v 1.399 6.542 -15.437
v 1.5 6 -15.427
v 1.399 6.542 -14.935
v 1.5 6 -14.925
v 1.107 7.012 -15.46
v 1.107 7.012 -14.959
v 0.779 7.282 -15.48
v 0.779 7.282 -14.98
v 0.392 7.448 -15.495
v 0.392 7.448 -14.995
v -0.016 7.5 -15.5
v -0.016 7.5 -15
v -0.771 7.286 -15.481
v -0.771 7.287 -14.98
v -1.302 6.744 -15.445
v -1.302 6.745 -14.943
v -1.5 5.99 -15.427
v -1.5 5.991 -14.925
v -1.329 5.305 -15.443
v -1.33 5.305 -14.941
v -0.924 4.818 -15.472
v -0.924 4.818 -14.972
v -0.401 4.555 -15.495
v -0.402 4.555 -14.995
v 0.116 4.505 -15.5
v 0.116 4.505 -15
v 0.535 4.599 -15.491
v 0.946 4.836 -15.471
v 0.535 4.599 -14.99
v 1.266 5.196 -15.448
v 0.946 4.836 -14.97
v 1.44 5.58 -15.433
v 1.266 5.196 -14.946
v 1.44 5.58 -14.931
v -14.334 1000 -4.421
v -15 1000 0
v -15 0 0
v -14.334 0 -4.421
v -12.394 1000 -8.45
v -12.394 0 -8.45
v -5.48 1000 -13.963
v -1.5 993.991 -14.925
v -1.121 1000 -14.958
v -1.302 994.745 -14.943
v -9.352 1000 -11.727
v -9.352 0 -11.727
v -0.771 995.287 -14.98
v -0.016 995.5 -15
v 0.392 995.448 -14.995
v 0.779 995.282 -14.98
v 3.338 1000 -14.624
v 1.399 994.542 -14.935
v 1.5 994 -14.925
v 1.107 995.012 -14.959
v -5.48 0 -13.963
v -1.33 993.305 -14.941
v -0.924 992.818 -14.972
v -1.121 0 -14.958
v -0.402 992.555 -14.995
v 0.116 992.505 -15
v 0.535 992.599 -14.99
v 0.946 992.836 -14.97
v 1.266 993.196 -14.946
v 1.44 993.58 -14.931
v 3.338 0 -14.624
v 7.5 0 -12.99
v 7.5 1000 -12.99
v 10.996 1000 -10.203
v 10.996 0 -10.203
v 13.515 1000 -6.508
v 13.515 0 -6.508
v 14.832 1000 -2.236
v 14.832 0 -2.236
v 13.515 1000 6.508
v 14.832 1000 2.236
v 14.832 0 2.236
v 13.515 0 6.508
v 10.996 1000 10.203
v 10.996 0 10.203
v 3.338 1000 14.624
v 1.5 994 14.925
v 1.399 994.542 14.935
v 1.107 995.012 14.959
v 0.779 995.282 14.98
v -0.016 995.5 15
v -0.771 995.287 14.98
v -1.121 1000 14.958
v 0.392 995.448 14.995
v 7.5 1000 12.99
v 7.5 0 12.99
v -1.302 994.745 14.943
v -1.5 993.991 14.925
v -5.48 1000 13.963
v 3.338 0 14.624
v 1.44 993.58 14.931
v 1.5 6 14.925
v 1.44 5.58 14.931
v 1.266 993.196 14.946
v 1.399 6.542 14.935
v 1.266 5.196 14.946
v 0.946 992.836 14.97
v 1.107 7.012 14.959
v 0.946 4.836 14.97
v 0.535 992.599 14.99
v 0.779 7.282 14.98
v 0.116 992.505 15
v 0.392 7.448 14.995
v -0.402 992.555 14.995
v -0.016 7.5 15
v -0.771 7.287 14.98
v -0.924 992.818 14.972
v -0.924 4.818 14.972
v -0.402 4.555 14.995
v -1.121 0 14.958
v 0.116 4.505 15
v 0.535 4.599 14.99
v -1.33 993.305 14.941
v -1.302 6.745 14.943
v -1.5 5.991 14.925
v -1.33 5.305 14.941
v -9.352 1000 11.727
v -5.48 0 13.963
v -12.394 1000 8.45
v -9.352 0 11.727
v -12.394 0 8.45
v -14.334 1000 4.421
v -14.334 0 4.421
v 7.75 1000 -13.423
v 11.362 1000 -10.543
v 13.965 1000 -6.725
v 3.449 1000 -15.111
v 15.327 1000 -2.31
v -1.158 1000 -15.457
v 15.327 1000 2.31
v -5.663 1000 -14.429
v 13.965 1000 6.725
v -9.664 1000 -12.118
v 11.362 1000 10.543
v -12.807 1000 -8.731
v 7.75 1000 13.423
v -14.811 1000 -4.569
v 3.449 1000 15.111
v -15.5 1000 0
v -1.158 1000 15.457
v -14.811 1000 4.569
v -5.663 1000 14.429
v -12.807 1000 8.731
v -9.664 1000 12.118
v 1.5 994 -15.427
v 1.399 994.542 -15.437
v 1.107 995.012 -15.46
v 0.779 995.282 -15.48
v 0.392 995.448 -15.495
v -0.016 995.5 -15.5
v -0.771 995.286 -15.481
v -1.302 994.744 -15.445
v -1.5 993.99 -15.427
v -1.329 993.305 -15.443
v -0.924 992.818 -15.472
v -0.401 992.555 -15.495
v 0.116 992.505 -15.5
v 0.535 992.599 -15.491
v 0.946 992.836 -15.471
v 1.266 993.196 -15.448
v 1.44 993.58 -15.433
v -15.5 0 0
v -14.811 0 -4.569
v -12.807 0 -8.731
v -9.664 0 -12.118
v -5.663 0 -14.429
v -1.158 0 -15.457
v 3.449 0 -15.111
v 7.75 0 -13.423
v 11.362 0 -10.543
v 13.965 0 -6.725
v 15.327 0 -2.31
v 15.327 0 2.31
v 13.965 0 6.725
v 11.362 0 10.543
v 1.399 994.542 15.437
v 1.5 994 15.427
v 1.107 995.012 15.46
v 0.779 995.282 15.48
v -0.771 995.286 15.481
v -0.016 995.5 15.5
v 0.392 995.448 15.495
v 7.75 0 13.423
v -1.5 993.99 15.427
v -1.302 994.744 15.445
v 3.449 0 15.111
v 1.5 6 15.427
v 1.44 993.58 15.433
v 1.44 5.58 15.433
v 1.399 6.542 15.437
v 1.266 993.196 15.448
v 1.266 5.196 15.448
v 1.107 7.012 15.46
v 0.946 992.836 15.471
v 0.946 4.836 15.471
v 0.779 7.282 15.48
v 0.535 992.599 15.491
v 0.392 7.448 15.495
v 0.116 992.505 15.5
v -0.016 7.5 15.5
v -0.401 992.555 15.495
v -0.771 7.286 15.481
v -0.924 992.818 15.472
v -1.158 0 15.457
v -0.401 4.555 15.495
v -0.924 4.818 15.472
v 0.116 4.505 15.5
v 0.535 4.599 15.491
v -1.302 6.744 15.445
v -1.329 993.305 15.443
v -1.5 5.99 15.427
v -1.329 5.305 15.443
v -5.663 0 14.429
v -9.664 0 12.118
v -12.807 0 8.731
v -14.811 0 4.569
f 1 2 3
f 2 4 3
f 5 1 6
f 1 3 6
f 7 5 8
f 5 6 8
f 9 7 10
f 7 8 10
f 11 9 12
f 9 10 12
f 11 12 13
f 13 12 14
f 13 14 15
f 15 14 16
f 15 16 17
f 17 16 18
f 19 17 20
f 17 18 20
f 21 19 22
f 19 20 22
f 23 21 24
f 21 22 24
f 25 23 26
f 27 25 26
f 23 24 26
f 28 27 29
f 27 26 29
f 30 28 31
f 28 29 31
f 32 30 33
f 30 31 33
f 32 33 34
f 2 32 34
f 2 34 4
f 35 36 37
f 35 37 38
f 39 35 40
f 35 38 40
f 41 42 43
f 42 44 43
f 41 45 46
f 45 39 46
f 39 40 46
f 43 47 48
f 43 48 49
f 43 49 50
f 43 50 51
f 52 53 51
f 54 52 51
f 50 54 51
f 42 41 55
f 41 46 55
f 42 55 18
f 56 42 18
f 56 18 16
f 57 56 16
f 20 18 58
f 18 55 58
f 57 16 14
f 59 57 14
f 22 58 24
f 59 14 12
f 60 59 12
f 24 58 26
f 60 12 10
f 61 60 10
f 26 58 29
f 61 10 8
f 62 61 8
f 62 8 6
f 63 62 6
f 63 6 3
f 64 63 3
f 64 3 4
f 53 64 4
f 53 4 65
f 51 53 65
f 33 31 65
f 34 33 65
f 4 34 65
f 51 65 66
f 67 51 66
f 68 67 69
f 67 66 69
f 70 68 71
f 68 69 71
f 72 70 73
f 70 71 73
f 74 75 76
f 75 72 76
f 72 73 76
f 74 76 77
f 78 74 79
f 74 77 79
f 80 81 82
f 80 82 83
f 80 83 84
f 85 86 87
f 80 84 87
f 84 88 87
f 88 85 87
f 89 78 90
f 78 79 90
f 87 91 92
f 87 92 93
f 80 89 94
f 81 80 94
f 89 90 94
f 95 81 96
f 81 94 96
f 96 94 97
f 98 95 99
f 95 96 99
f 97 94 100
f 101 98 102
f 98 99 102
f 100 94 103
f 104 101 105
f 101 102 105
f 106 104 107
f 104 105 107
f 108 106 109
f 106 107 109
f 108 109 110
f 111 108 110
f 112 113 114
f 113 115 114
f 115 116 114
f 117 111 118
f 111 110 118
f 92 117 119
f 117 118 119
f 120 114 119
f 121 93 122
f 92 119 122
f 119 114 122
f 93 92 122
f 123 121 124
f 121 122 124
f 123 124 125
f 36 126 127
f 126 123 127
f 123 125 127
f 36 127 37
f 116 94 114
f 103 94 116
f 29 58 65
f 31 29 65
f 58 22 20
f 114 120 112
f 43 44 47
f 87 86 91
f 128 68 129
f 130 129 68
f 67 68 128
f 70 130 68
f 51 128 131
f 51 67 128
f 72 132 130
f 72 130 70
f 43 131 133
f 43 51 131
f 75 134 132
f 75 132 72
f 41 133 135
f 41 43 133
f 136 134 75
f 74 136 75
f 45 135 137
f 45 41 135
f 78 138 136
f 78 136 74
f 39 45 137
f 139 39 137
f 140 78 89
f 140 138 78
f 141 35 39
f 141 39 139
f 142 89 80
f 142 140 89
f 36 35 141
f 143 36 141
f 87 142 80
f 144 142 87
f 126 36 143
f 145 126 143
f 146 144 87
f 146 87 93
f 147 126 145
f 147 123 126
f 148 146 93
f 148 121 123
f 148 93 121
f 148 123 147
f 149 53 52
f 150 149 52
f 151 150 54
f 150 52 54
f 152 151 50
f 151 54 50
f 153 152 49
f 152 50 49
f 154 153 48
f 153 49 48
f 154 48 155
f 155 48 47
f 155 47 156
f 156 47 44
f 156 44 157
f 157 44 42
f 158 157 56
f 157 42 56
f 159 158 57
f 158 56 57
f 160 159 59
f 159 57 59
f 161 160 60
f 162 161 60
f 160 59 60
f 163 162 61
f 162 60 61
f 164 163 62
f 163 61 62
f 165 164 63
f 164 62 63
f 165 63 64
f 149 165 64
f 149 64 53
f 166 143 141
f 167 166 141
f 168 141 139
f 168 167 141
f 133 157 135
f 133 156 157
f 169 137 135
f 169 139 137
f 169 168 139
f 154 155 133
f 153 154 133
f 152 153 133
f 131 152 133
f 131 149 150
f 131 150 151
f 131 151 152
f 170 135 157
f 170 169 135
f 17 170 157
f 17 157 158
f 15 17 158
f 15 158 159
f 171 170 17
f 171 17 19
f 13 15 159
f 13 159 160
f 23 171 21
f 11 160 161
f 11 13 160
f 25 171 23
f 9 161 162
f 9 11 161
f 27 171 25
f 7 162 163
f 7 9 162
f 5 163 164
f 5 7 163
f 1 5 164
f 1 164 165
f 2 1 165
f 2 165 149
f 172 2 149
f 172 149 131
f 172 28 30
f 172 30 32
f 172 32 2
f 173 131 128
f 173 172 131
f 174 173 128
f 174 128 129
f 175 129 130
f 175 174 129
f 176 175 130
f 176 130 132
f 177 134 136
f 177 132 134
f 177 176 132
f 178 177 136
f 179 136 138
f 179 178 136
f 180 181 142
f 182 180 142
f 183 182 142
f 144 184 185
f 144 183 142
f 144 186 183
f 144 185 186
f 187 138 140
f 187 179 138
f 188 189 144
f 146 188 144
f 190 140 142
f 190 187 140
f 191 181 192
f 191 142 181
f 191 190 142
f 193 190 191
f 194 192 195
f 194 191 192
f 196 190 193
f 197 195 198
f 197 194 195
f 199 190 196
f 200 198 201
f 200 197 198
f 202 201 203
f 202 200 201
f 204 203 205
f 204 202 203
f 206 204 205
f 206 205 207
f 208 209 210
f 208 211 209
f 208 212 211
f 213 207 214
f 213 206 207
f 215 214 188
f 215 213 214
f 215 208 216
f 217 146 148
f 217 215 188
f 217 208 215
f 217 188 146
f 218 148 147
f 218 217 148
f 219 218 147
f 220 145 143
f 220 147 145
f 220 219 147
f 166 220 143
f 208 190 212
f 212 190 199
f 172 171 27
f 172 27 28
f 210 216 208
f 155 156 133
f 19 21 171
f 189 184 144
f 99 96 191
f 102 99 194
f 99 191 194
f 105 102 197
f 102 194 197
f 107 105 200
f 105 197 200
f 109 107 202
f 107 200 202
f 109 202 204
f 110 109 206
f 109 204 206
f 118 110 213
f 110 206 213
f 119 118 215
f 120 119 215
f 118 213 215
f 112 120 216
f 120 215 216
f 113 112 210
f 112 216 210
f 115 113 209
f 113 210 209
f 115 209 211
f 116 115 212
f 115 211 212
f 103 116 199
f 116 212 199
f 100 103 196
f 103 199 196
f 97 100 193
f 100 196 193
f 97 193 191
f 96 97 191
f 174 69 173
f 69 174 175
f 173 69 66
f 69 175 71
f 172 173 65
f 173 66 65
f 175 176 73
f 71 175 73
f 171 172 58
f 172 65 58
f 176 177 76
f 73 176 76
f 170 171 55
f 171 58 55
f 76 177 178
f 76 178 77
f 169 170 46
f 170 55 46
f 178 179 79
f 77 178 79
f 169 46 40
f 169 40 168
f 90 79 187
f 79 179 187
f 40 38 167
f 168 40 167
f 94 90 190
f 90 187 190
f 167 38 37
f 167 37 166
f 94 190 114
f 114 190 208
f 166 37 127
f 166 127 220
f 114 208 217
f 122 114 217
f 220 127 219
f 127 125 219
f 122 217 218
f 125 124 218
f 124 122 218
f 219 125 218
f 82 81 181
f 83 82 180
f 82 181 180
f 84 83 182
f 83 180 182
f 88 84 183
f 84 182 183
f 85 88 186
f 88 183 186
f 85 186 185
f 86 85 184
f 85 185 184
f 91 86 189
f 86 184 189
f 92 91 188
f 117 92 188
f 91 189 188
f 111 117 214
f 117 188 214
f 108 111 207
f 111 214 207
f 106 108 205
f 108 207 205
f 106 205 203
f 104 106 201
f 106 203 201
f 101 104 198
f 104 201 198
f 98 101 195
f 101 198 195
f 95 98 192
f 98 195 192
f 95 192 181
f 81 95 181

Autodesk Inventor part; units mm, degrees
ref_plane "YZ Plane" through (0, 0, 0) normal (1, 0, 0) x (0, 1, 0)
ref_plane "XZ Plane" through (0, 0, 0) normal (0, 1, 0) x (-1, 0, 0)
ref_plane "XY Plane" through (0, 0, 0) normal (0, 0, 1) x (1, 0, 0)
sketch "Sketch1" plane through (0, 0, 0) normal (0, 1, 0) x (-1, 0, 0)
  circle A0 centre (0, 0) radius 15
  circle A1 centre (0, 0) radius 15.5
  dimension "d0" = 30
  dimension "d1" = 31
extrude "Extrusion1" add sketch "Sketch1" along normal blind 1000
sketch "Sketch2" plane through (0, 0, 0) normal (0, 0, 1) x (1, 0, 0)
  line L0 (0, 0) -> (0, 6)
  line L1 (0, 0) -> (6, 0) construction
  circle A0 centre (0, 6) radius 1.5
  line L2 (15.5, 1000) -> (-15.5, 1000) projected
  line L3 (0, 1000) -> (0, 994)
  circle A1 centre (0, 994) radius 1.5
  dimension "d4" = 6
  dimension "d5" = 90
  dimension "d6" = 3
  dimension "d7" = 6
  dimension "d8" = 3
extrude "Extrusion2" cut sketch "Sketch2" along normal mid plane 40
properties part number "30 mm tube"
